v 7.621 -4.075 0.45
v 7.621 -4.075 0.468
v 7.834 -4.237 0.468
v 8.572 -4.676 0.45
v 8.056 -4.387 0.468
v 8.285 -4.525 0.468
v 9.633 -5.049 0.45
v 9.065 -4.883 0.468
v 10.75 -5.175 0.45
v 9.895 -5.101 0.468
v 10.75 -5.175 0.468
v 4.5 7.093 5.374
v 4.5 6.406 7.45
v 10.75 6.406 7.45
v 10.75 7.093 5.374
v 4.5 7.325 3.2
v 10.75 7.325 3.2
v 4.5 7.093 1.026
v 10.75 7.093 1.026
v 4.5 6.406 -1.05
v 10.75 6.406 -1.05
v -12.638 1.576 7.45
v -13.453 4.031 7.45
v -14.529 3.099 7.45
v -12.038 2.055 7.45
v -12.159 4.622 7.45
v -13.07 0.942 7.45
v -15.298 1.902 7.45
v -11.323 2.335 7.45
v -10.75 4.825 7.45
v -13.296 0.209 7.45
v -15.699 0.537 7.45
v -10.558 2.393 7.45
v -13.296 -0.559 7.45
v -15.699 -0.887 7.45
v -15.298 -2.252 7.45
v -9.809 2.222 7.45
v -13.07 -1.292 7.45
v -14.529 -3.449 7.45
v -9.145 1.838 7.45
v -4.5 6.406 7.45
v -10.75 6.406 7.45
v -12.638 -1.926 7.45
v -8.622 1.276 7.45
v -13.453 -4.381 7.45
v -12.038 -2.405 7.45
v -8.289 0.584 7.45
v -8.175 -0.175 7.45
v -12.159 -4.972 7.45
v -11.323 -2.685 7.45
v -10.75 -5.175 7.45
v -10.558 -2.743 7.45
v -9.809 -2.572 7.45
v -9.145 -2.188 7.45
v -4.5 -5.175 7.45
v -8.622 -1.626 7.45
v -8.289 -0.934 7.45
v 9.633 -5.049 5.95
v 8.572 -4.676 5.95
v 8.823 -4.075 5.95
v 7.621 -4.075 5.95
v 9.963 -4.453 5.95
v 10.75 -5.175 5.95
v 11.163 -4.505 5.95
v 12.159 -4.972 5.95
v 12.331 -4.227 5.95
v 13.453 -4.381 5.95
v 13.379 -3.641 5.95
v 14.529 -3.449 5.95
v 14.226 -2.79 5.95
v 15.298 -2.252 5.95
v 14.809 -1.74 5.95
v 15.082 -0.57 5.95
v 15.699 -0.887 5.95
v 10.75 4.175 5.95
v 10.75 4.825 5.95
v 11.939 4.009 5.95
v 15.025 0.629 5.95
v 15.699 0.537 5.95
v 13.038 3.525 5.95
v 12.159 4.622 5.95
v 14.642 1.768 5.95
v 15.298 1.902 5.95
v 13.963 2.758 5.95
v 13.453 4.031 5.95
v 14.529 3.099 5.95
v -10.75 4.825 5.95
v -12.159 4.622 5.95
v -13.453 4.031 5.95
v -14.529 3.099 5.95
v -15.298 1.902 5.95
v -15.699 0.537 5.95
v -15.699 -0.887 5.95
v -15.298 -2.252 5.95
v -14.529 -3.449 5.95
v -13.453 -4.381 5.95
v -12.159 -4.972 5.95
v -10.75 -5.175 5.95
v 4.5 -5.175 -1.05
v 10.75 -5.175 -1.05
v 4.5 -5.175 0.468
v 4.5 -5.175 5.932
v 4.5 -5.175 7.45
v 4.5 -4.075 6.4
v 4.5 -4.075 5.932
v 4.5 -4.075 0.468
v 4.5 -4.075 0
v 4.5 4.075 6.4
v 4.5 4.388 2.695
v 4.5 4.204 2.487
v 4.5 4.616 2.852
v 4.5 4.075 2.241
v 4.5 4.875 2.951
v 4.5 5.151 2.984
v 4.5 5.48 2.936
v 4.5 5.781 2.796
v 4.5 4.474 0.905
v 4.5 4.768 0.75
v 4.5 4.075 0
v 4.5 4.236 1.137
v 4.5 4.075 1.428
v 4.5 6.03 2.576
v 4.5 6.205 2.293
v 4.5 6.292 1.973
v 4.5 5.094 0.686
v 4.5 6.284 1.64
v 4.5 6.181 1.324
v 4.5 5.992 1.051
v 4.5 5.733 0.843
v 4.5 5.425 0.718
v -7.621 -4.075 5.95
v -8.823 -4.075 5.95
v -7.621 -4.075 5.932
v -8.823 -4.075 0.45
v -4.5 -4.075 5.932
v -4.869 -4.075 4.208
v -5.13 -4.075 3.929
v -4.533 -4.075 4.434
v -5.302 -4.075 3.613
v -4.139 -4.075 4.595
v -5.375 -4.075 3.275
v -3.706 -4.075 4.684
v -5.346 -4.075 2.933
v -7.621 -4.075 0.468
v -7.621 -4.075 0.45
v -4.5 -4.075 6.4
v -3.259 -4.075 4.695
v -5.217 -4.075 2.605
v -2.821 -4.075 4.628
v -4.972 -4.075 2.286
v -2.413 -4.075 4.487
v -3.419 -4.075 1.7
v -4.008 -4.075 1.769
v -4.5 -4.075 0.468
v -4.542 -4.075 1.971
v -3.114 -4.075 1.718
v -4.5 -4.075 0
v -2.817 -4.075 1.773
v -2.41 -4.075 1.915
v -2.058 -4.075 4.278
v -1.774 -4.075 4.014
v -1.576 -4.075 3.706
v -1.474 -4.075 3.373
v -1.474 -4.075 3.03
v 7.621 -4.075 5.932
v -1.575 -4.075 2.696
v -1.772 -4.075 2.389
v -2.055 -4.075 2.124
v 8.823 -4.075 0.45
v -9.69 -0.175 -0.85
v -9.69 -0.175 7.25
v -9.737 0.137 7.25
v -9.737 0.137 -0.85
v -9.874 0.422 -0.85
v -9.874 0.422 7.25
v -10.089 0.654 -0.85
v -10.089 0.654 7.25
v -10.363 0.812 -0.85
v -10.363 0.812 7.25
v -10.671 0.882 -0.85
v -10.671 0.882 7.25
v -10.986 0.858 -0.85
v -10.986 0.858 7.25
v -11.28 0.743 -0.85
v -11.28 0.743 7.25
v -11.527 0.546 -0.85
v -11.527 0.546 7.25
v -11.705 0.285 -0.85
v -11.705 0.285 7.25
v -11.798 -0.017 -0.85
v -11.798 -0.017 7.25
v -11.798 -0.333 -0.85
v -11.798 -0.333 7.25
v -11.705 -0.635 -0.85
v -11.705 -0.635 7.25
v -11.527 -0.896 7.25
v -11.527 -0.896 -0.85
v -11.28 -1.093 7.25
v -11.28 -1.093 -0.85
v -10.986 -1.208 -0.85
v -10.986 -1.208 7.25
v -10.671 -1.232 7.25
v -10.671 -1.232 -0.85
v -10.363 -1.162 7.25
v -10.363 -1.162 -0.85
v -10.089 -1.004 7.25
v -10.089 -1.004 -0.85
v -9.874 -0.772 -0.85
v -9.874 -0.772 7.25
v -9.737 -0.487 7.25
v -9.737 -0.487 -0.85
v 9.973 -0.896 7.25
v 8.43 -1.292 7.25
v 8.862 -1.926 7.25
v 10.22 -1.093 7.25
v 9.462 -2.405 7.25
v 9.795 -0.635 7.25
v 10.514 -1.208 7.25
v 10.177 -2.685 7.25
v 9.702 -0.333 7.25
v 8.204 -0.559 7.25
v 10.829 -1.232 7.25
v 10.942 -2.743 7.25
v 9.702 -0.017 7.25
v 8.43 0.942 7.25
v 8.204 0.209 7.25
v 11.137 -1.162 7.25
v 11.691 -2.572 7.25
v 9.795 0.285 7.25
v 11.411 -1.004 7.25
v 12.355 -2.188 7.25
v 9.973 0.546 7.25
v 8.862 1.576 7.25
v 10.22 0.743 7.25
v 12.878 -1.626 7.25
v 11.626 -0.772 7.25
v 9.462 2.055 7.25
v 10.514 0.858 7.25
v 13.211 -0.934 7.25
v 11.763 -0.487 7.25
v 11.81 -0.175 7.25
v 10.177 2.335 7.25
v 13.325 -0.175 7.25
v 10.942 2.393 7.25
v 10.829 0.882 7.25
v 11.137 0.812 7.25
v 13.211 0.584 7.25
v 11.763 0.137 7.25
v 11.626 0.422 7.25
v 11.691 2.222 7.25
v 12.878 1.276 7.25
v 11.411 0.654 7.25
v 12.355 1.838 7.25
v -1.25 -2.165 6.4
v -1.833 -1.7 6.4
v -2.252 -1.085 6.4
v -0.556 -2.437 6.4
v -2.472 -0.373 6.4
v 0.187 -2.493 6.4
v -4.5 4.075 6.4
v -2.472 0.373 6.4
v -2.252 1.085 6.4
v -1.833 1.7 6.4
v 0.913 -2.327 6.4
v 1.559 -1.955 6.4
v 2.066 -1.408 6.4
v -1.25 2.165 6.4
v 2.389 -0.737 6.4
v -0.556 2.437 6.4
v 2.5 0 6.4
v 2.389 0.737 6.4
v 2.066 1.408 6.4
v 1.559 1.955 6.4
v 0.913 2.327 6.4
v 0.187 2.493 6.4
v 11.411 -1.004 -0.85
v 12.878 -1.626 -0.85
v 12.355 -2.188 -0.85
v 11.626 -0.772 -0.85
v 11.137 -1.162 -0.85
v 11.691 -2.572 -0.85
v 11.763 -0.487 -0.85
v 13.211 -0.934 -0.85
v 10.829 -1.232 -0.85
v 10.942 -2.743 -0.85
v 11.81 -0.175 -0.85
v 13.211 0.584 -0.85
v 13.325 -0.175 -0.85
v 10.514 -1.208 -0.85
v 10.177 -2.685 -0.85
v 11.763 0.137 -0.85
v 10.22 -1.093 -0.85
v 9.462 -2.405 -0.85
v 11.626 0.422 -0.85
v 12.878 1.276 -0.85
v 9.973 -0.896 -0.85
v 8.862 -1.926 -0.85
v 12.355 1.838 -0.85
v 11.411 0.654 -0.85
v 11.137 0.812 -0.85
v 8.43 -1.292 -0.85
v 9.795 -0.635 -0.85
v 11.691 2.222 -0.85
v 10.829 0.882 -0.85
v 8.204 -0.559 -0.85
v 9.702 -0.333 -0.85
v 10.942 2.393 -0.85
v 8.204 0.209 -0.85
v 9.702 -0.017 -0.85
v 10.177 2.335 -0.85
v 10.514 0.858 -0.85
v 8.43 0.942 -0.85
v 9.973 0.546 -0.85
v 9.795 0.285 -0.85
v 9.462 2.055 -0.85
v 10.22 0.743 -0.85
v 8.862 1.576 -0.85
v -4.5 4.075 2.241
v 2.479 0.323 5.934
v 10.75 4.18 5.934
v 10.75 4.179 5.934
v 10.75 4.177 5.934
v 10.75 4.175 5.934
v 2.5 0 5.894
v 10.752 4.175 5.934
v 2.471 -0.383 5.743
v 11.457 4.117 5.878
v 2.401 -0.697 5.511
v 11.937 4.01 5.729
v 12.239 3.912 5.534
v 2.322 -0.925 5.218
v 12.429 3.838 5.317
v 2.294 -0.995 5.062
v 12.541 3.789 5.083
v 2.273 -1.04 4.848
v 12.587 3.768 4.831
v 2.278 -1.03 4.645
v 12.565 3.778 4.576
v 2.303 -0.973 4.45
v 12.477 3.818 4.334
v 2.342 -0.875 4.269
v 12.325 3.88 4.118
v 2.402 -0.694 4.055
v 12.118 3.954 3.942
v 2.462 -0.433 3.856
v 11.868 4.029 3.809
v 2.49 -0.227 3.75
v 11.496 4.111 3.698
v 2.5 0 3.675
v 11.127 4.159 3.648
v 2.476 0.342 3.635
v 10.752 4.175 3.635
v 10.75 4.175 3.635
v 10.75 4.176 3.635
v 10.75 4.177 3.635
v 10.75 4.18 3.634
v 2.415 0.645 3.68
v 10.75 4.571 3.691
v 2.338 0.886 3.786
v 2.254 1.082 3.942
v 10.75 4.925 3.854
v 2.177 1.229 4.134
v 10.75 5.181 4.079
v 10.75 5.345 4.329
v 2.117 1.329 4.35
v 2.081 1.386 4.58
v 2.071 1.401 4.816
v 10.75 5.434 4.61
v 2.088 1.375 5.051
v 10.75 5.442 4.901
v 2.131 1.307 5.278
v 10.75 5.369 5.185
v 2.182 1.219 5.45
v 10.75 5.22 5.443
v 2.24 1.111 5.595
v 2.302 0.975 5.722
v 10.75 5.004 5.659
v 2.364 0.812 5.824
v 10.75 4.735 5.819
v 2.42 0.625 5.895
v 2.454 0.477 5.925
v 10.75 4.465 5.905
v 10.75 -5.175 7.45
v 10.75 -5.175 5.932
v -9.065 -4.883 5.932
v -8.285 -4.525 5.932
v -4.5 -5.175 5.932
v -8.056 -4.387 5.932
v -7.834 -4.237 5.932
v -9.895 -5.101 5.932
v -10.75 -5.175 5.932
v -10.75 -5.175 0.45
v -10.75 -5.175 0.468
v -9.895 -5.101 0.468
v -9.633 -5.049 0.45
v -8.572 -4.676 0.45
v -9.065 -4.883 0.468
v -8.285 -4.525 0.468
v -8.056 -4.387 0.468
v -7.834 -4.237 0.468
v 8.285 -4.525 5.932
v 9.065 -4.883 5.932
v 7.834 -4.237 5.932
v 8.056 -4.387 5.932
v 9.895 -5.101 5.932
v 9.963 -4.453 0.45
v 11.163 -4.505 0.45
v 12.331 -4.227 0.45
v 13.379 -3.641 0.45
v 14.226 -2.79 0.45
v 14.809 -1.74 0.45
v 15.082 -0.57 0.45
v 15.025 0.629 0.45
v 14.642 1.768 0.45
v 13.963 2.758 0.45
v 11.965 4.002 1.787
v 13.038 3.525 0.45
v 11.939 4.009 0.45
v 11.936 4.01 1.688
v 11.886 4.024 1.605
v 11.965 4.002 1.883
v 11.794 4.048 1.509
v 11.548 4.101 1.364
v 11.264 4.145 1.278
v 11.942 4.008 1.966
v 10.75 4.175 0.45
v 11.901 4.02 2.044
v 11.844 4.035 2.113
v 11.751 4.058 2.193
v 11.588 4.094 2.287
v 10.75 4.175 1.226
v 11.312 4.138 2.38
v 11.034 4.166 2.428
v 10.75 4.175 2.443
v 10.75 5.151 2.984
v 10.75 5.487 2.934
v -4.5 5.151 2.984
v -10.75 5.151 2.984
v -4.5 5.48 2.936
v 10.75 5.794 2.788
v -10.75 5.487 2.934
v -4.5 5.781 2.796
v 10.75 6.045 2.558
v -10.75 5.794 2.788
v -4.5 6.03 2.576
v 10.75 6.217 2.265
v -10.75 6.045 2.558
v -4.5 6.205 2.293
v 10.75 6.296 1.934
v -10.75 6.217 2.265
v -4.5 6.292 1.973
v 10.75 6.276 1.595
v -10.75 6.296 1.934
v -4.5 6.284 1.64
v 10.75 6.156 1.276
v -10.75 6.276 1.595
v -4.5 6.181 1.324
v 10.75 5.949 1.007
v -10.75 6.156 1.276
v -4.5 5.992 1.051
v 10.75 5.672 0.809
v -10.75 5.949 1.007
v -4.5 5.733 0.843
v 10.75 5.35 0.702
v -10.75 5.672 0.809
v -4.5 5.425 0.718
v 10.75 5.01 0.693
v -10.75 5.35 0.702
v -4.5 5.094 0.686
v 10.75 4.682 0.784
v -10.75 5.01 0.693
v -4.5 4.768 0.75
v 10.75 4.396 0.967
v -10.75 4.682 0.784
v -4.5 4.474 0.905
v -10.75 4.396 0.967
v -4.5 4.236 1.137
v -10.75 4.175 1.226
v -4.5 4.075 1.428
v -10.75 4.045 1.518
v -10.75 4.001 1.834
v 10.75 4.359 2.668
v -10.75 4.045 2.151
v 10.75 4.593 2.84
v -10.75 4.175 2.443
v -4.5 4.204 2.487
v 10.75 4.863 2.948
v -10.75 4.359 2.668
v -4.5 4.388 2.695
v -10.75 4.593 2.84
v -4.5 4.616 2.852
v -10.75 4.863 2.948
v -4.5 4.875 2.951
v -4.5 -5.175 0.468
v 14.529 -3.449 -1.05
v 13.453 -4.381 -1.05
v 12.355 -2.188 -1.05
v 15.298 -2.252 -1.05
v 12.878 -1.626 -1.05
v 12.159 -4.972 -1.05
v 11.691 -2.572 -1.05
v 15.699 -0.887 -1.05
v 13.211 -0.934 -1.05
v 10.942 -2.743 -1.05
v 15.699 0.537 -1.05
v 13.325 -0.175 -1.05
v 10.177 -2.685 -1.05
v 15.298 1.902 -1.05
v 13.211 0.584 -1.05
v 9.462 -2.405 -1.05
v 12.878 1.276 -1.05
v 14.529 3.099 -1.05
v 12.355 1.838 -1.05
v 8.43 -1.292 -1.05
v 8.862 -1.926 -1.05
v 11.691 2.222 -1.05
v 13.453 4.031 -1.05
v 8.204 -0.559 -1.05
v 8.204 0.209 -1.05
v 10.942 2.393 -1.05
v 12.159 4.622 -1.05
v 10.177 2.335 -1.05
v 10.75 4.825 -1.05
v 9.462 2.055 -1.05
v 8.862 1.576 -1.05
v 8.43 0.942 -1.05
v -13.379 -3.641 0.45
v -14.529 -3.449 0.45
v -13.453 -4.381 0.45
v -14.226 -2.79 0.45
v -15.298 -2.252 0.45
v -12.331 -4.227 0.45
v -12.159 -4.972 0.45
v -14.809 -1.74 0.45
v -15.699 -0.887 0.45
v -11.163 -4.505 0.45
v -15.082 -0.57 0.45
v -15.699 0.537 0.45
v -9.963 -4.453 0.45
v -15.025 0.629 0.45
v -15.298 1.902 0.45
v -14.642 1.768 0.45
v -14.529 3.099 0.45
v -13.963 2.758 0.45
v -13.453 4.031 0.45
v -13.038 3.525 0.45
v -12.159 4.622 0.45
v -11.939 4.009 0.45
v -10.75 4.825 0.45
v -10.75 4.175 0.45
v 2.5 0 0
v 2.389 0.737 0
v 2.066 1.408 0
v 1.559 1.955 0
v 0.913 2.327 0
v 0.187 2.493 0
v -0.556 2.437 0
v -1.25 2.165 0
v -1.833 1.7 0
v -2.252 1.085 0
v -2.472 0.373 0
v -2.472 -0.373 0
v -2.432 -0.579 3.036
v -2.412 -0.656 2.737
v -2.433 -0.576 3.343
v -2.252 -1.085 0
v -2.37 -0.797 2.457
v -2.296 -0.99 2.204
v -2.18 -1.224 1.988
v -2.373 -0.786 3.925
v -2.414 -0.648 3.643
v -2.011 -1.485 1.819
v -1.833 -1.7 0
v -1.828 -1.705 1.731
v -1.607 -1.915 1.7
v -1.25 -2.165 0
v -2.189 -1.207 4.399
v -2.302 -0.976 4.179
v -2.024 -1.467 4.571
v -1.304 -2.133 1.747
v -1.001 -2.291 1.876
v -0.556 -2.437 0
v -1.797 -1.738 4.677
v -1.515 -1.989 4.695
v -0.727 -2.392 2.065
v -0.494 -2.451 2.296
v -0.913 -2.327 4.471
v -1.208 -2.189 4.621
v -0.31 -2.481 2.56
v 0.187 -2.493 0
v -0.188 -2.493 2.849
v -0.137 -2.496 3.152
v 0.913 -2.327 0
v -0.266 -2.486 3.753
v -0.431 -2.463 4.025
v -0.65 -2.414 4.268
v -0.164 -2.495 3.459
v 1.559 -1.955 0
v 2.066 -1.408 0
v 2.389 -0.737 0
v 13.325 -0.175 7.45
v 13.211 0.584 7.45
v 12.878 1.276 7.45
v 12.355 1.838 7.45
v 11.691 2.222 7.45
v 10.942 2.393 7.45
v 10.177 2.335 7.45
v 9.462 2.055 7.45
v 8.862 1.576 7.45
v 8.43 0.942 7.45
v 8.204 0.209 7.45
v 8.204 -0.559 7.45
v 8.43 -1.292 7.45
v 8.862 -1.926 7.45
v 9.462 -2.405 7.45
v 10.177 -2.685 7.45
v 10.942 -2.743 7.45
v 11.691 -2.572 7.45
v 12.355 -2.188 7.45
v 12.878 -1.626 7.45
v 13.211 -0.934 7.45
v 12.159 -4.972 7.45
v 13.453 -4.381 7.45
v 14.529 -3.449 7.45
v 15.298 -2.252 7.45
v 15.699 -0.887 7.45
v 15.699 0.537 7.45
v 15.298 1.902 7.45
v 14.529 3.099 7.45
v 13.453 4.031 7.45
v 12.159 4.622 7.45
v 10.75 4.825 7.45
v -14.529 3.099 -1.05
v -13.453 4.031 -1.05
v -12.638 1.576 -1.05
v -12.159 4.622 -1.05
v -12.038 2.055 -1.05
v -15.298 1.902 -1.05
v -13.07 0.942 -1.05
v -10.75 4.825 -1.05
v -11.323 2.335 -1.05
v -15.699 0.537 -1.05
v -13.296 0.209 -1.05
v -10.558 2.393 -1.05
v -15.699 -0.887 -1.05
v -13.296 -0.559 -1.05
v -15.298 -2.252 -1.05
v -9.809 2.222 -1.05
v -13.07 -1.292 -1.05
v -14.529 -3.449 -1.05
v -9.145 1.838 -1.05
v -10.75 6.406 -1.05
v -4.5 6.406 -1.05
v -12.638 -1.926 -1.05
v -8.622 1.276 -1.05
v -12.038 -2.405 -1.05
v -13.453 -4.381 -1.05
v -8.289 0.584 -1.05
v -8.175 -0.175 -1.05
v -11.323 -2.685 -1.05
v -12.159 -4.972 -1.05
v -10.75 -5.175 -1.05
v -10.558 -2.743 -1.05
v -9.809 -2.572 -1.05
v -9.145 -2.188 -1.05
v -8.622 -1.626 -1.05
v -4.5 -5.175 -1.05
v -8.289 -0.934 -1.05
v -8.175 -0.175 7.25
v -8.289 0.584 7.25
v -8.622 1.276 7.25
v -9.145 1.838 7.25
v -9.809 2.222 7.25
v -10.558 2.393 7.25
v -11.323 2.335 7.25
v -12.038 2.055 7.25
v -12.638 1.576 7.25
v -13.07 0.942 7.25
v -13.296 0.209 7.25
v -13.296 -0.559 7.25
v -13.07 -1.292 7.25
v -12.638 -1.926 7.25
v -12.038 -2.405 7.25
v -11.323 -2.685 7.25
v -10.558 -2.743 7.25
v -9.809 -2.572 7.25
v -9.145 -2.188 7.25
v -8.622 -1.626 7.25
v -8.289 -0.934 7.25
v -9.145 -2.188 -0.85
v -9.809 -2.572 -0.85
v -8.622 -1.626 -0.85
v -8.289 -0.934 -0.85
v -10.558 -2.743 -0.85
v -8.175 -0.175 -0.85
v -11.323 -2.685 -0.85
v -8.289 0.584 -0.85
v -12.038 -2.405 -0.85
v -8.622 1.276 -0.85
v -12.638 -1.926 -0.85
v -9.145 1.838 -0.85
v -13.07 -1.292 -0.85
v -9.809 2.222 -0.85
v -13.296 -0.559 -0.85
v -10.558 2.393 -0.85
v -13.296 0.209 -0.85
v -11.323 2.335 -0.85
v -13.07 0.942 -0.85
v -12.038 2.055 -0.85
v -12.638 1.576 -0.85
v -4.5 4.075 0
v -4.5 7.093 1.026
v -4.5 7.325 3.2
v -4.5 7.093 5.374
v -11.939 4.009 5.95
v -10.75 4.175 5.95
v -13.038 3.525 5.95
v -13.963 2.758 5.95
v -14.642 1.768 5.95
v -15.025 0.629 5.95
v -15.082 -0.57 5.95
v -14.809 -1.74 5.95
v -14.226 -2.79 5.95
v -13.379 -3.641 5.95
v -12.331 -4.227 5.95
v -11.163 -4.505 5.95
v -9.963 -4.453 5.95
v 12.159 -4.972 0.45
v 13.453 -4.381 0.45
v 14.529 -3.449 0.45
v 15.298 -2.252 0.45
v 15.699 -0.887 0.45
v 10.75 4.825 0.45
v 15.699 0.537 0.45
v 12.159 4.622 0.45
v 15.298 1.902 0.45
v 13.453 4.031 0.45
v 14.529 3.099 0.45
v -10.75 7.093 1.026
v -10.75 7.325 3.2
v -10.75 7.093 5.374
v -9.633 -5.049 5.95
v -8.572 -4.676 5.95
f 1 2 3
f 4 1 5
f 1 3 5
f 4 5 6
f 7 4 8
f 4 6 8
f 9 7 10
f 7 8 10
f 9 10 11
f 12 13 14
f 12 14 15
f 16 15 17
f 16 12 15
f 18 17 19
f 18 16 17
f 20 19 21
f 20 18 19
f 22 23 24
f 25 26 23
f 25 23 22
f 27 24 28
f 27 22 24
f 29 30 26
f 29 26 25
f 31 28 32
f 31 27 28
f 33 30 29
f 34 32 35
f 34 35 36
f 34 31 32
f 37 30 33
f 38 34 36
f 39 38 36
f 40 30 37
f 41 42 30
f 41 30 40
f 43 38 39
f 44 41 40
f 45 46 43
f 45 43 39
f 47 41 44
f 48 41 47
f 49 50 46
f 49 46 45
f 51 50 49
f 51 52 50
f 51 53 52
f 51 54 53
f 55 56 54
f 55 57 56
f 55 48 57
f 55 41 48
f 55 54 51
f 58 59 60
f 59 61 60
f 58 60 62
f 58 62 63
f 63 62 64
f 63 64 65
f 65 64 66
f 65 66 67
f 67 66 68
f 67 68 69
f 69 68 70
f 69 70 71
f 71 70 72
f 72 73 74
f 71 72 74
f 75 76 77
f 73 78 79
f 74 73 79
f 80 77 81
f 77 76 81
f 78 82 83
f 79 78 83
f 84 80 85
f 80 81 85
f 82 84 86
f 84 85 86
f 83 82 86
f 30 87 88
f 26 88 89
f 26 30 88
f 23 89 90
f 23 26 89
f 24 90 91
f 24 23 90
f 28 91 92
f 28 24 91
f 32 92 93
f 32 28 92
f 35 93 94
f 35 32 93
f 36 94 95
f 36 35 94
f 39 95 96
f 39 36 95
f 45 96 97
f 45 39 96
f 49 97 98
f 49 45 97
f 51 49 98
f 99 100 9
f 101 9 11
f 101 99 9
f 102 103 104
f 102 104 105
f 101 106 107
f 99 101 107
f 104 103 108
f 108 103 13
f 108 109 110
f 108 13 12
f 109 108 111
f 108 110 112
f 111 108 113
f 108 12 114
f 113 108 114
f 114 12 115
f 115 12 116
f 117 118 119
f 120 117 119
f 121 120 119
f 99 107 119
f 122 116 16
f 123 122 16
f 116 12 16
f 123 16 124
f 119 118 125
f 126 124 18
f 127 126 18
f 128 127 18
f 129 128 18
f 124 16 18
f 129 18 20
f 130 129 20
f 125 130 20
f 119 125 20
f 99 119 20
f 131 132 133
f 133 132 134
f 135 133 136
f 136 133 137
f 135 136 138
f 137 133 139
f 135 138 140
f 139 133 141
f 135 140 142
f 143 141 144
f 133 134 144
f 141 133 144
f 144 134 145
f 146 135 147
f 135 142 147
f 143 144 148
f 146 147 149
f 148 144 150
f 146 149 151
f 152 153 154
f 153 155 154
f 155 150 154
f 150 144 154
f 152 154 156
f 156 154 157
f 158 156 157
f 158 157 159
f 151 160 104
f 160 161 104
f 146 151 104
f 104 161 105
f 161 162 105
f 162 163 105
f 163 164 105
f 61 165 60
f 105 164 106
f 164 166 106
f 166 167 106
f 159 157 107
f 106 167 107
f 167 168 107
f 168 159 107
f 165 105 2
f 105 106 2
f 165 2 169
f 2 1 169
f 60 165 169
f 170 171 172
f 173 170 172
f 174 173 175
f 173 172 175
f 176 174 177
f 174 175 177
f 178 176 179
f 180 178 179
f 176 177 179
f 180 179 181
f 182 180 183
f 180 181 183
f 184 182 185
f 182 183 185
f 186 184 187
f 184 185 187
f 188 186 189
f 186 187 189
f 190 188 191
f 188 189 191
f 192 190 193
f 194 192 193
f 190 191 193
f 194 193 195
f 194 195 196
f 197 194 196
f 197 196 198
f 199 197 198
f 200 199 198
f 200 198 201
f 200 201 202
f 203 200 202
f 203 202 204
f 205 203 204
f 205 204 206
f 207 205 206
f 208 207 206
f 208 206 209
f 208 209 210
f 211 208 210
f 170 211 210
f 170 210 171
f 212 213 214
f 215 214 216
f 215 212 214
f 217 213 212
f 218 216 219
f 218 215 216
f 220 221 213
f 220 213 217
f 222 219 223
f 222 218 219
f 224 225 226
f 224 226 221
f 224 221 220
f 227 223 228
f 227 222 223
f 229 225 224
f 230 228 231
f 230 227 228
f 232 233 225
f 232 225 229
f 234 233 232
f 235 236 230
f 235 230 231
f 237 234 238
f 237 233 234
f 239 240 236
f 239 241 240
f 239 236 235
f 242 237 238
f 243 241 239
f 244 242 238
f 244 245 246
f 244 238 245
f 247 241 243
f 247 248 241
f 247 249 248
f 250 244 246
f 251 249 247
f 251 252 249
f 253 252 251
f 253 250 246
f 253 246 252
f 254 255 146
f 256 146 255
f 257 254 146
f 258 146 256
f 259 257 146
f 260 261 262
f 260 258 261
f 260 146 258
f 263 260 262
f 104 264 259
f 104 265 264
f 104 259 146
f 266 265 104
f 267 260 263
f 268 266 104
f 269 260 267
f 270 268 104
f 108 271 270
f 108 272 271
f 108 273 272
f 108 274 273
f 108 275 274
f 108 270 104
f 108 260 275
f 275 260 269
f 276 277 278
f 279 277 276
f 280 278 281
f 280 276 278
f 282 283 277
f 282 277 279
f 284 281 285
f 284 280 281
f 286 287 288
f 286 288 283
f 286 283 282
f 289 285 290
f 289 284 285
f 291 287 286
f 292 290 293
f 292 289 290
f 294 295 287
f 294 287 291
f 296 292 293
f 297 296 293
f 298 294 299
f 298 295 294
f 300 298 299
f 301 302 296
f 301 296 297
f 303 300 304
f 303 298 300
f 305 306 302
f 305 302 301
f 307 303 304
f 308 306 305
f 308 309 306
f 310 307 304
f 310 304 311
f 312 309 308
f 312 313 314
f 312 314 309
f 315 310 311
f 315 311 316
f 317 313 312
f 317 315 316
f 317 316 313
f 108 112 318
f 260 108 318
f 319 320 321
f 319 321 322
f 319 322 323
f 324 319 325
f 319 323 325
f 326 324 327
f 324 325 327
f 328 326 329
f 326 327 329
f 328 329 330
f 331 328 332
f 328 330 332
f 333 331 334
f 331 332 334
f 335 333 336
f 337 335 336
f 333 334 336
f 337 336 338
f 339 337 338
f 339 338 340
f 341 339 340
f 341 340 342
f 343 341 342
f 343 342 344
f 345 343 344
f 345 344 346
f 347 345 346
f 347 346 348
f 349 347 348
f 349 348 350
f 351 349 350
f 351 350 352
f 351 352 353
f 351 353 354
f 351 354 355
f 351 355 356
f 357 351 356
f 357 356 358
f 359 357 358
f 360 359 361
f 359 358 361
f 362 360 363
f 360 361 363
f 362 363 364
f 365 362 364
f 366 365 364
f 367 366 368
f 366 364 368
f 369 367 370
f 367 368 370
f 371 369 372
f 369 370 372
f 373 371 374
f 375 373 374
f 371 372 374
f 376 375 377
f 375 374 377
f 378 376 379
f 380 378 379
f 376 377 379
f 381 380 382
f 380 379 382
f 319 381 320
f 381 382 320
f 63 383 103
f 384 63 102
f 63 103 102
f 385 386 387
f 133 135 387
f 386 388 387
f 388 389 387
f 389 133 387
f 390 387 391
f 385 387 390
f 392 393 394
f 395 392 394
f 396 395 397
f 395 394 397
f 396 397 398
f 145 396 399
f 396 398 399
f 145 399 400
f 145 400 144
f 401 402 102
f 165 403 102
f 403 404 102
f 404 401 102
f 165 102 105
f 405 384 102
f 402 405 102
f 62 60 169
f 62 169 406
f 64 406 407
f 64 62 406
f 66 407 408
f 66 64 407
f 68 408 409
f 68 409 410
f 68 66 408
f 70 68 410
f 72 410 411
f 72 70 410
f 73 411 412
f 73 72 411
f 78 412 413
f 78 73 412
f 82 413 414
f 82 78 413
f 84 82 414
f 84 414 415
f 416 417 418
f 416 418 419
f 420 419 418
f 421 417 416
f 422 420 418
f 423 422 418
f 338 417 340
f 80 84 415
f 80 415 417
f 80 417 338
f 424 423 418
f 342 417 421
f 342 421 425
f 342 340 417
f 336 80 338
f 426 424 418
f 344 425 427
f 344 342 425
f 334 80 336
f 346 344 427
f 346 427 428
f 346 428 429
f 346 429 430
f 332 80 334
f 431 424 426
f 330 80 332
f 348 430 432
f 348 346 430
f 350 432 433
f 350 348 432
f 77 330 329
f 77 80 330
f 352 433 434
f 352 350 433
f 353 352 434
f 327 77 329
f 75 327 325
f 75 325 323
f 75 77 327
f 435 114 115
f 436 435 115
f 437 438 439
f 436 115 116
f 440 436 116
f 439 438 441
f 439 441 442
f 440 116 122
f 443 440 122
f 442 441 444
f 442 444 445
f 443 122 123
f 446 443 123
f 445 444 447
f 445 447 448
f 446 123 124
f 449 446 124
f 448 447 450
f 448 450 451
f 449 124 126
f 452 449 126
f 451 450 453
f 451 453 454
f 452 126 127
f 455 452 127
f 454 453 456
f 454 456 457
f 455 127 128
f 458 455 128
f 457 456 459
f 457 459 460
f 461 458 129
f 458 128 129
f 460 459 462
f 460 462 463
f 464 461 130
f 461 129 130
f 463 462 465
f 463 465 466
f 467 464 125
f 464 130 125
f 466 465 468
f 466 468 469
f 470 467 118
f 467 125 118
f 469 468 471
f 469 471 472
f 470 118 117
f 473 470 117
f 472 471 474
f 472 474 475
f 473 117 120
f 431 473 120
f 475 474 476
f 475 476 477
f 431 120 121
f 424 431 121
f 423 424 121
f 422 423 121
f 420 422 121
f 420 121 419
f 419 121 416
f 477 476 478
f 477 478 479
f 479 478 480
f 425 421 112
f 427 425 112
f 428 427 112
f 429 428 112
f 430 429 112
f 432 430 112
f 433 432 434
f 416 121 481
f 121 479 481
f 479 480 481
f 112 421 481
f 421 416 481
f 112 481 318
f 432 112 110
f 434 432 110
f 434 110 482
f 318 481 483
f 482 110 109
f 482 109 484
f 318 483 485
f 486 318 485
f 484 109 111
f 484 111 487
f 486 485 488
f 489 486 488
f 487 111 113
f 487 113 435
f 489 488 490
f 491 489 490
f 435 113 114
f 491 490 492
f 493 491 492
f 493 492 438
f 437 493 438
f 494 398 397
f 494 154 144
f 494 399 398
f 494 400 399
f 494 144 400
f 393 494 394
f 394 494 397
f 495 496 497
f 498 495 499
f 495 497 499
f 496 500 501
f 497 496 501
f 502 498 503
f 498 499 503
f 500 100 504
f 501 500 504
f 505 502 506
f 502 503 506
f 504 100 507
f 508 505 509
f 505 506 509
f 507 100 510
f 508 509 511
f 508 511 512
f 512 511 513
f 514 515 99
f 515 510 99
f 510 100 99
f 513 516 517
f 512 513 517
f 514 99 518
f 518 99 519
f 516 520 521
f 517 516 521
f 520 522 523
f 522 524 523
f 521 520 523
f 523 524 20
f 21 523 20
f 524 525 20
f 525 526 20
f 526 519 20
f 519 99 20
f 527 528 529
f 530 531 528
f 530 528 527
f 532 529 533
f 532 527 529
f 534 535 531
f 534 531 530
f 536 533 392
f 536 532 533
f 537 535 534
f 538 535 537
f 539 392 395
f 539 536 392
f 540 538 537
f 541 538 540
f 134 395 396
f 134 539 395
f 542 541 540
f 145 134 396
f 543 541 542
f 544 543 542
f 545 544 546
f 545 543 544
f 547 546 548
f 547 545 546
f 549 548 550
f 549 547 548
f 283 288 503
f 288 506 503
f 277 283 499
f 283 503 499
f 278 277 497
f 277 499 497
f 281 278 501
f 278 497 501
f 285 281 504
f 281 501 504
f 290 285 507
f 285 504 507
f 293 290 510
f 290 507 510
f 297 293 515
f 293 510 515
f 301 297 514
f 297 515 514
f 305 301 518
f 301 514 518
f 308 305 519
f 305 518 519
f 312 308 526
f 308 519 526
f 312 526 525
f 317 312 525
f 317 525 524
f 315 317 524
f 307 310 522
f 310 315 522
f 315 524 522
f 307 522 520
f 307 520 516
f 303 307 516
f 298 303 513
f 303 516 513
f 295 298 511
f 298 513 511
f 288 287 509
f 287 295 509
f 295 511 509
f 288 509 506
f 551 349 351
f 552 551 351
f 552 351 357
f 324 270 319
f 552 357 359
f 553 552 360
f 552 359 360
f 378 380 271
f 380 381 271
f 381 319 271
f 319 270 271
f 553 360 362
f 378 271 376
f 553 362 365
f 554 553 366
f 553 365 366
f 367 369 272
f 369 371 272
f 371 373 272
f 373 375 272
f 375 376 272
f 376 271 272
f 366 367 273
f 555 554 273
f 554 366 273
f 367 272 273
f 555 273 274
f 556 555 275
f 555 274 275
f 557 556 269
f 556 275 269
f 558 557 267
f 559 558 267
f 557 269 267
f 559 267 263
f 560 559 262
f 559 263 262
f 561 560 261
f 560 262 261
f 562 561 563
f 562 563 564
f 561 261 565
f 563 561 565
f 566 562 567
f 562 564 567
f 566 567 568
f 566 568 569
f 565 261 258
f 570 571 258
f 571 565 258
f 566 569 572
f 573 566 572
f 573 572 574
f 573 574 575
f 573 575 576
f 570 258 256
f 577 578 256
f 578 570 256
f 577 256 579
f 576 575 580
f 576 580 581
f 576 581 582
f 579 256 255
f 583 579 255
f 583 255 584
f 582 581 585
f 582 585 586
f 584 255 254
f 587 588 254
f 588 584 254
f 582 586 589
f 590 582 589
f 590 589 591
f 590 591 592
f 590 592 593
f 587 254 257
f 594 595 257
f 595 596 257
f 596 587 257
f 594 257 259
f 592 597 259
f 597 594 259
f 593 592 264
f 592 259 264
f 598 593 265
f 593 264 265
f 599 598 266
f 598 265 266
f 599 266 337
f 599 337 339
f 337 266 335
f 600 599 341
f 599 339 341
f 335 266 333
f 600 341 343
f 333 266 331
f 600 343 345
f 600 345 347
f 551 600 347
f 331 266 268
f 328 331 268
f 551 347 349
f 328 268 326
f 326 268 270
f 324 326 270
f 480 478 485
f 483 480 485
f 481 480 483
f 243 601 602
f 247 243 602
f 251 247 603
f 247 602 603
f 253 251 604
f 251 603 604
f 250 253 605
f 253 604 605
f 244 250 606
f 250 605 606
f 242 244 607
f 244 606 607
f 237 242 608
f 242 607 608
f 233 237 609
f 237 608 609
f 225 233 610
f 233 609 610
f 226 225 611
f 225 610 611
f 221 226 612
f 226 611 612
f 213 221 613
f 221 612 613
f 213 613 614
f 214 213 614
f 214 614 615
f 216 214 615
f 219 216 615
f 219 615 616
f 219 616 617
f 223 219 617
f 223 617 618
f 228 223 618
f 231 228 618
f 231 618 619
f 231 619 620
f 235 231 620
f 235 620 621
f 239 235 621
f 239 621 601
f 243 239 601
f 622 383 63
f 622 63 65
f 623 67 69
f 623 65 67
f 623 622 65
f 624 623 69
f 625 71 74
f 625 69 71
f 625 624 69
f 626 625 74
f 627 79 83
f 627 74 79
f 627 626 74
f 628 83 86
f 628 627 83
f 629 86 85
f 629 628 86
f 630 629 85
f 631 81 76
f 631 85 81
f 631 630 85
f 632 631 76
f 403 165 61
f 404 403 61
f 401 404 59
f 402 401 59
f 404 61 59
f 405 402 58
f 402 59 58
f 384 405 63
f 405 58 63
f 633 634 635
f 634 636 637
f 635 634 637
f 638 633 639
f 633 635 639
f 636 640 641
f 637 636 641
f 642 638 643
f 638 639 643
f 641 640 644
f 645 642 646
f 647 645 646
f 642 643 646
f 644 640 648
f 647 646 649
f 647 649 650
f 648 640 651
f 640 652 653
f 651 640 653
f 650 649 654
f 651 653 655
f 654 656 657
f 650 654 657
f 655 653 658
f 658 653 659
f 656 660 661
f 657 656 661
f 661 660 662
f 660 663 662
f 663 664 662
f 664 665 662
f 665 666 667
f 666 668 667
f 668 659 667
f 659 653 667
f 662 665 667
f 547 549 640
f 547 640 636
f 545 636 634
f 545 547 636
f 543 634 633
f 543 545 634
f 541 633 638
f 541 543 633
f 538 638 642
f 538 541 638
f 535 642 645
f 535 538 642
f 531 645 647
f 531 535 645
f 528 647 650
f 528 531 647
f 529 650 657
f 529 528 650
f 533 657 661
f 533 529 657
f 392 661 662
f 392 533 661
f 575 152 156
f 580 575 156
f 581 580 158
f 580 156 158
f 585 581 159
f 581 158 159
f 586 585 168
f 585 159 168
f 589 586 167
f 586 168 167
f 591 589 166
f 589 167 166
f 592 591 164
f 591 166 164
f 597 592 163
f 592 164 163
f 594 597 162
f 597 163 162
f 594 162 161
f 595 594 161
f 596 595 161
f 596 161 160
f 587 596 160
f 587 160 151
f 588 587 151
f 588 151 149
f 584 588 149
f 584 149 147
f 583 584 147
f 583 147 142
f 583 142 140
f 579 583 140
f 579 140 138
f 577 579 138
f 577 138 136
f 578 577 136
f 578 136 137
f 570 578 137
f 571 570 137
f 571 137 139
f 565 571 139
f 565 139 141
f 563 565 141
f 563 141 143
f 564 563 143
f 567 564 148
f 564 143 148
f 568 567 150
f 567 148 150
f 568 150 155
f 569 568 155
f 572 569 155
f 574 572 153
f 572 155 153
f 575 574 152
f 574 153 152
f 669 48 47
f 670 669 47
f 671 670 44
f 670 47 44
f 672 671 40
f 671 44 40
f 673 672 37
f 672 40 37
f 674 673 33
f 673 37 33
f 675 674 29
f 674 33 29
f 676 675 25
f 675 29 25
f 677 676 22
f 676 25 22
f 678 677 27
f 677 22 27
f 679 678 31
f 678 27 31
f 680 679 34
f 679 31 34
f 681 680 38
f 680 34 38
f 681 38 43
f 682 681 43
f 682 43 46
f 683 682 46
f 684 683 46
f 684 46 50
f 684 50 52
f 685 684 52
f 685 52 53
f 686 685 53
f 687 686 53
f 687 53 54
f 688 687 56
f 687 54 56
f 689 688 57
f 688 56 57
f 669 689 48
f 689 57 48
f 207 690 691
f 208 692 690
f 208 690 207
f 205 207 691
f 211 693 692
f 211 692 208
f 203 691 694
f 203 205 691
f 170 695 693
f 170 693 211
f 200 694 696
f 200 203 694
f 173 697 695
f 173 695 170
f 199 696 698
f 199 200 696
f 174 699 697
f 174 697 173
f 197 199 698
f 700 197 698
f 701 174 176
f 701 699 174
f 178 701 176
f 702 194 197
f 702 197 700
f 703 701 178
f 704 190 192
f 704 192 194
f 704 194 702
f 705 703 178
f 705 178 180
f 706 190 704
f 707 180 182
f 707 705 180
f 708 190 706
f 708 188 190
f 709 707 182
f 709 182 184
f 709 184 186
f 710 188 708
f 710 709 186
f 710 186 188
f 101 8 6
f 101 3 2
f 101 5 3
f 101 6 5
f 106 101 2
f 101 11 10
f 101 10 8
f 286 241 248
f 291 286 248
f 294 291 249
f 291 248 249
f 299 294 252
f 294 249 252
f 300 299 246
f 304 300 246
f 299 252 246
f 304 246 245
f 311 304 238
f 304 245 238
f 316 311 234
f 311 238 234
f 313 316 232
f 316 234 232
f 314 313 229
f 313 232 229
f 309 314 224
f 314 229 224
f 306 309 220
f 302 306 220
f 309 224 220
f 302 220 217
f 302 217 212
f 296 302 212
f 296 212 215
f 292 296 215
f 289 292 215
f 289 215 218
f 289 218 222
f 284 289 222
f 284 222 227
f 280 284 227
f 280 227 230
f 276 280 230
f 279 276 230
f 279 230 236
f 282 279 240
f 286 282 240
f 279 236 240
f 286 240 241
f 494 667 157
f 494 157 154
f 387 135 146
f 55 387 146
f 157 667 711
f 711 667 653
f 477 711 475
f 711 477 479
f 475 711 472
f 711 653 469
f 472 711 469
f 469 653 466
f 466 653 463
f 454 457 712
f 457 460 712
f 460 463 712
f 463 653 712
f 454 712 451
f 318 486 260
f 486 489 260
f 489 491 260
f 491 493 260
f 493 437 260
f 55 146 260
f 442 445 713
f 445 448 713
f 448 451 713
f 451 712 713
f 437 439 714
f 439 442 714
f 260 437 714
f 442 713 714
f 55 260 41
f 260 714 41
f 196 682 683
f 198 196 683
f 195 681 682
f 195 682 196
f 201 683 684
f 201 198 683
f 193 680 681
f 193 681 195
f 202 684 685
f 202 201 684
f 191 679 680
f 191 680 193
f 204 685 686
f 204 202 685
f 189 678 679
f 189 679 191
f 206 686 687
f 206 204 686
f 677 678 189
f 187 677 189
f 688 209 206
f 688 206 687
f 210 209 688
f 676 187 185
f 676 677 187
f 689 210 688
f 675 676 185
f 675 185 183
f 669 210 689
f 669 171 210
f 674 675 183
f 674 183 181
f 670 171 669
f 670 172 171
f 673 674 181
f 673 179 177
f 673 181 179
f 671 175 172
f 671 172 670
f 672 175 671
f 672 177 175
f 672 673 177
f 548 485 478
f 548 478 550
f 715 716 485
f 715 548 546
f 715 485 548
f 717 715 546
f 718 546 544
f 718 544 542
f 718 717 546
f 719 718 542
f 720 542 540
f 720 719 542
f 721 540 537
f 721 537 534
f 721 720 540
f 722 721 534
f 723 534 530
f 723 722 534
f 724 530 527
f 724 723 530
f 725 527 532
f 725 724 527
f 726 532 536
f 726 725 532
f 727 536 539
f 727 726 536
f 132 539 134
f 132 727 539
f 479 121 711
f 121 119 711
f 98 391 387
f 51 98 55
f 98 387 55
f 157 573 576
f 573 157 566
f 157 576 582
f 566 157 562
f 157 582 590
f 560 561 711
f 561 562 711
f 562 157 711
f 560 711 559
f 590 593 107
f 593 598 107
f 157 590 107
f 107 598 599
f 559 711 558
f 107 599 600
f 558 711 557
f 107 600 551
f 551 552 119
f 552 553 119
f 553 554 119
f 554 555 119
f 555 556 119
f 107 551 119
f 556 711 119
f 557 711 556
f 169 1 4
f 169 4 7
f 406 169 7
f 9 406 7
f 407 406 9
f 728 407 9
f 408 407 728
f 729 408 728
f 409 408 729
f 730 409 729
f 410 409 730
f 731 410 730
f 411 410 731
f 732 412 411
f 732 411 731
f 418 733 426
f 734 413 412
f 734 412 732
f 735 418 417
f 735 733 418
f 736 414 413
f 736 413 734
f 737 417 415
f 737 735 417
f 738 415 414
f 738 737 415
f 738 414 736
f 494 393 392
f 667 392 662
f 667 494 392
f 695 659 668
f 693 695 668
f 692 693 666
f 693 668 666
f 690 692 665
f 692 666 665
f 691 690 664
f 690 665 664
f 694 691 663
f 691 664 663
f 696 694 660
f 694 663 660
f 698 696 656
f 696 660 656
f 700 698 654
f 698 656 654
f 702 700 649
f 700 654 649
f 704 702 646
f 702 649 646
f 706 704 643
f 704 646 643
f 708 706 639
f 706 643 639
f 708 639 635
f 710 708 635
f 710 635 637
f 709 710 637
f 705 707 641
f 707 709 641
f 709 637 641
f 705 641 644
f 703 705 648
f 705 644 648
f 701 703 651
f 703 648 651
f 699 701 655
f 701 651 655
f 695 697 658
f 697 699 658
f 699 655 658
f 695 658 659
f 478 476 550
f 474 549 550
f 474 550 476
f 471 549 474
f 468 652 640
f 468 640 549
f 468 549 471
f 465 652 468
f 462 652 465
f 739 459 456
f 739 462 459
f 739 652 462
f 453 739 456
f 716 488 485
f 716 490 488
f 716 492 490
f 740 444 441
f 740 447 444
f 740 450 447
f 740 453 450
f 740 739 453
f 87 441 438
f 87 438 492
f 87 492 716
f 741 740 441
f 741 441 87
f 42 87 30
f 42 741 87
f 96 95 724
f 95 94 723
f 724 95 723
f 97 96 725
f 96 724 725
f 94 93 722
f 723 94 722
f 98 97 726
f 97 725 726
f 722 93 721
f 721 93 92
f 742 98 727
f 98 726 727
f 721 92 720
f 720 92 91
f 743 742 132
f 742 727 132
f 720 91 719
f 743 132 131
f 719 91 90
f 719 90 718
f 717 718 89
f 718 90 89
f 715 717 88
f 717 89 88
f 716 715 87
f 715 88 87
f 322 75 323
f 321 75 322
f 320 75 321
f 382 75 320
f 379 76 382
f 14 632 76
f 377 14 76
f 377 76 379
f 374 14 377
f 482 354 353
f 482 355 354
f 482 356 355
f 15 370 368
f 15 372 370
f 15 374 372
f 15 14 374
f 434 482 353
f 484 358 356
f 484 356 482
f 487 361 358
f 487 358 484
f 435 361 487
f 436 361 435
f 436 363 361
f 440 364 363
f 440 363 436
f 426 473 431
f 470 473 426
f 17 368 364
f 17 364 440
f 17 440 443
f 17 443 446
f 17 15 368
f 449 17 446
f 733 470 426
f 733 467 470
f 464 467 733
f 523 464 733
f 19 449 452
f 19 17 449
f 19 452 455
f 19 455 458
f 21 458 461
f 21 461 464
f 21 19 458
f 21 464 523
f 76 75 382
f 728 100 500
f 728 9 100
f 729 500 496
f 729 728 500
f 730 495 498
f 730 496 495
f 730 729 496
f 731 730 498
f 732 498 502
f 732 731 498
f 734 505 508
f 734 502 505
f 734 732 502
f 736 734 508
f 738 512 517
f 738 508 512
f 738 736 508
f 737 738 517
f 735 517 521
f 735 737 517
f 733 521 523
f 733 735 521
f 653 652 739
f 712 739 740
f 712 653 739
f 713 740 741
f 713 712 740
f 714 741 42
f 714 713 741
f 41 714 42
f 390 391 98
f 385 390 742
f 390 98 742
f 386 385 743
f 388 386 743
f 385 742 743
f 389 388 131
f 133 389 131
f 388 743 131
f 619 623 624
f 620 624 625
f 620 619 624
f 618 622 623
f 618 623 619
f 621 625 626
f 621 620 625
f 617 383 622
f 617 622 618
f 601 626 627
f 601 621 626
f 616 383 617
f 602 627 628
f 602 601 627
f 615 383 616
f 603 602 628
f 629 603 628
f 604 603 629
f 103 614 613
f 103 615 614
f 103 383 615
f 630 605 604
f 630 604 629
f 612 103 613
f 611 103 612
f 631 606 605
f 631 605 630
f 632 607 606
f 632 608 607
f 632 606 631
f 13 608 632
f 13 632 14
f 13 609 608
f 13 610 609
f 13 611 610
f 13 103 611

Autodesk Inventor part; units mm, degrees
sketch "Sketch1" plane through (0, 0, 0) normal (0, 0, 1) x (1, 0, 0)
  line L0 (-4.5, -4.075) -> (4.5, -4.075)
  line L1 (4.5, -4.075) -> (4.5, 4.075)
  line L2 (4.5, 4.075) -> (-4.5, 4.075)
  line L3 (-4.5, 4.075) -> (-4.5, -4.075)
  line L4 (-4.5, -4.075) -> (4.5, 4.075) construction
  line L5 (4.5, -4.075) -> (-4.5, 4.075) construction
  point P0 (0, 0)
  dimension "d0" = 9
  dimension "d1" = 8.15
extrude "Extrusion1" add sketch "Sketch1" along normal blind 6.4
sketch "Sketch2" plane through (4.5, -4.075, 0) normal (1, 0, 0) x (0, 0, -1)
  line L0 (0, 8.15) -> (-6.4, 8.15) projected
  line L1 (-3.2, 8.15) -> (-3.2, 11.4)
  line L2 (-3.2, 8.15) -> (-7.45, 8.15)
  line L3 (-7.45, 8.15) -> (-7.45, -1.1)
  line L4 (0, 0) -> (-6.4, 0) projected
  line L5 (-5.9325, -1.1) -> (-5.9325, 0)
  line L6 (-7.45, -1.1) -> (-5.9325, -1.1)
  line L7 (-7.45, 8.15) -> (-7.45, 13.2689)
  line L8 (1.05, 8.15) -> (1.05, -1.1)
  line L9 (-0.4675, -1.1) -> (-0.4675, 0)
  line L10 (1.05, -1.1) -> (-0.4675, -1.1)
  line L11 (1.05, 8.15) -> (1.05, 13.2689)
  arc A0 (1.05, 10.4813) -> (-7.45, 10.4813) centre (-3.2, 1.1101) ccw
  line L12 (-7.45, 10.4813) -> (1.05, 10.4813) construction
  line L13 (-7.45, 10.4813) -> (1.05, 10.4813) construction
  point P0 (0, 4.075)
  point P1 (-0.4675, 0)
  dimension "d4" = 3.25
  dimension "d5" = 4.25
  dimension "d6" = 9.25
  dimension "d8" = 0
extrude "Extrusion2" add sketch "Sketch2" along normal blind 6.25
mirror "Mirror1" about plane through (0, 0, 0) normal (1, 0, 0) of "Extrusion2"
sketch "Sketch3" plane through (4.5, -5.175, 7.45) normal (0, 0, 1) x (1, 0, 0)
  line L0 (6.25, 0) -> (6.25, 11.5813) projected
  circle A0 centre (6.25, 5) radius 5
  line L1 (-4.5, 5.175) -> (-4.5, 2.6281)
  circle A1 centre (-15.25, 5) radius 5
  dimension "d11" = 10
extrude "Extrusion3" add sketch "Sketch3" against normal up to surface (8.5 mm away)
sketch "Sketch4" plane through (0, 0, 0) normal (1, 0, 0) x (0, 1, 0)
  line L0 (-5.175, 5.9325) -> (-4.075, 5.9325) projected
  line L1 (-4.075, 5.9325) -> (-4.075, 0.4675) projected
  line L2 (-4.075, 0.4675) -> (-5.175, 0.4675) projected
  line L3 (-5.175, 7.45) -> (-5.175, 5.9325) projected
  line L4 (-5.175, 0.4675) -> (-5.175, -1.05) projected
  line L5 (-5.175, 5.9325) -> (-5.175, 0.4675)
  line L6 (-5.175, 0.4675) -> (-4.525, 0.4675)
  line L7 (-4.525, 0.4675) -> (-4.525, 5.9325)
  line L8 (-5.175, 5.9325) -> (-4.075, 5.9325) projected
  line L9 (-4.525, 5.9325) -> (-5.175, 5.9325)
  point P0 (0, 0)
  dimension "d25" = 0.65
extrude "Extrusion4" cut sketch "Sketch4" against normal through all both and the other way through all contours L0 L7 L2 L5
sketch "Sketch5" plane through (4.5, -5.175, 7.45) normal (0, 0, 1) x (1, 0, 0)
  arc A0 (6.25, 0) -> (6.25, 10) centre (6.25, 5) ccw projected
  circle A1 centre (6.25, 5) radius 1.06
  line L0 (-4.5, 5.175) -> (-4.5, 8.0603)
  circle A2 centre (-15.25, 5) radius 1.06
  dimension "d16" = 2.12
extrude "Extrusion5" cut sketch "Sketch5" against normal through all
ref_plane "Work Plane1" through (4.5, -5.175, 3.2) normal (0, 0, 1) x (1, 0, 0)
sketch "Sketch6" plane through (4.5, -5.175, 3.2) normal (0, 0, 1) x (1, 0, 0)
  circle A0 centre (6.25, 5) radius 1.06 projected
  arc A1 (3.1211, 1.1) -> (6.25, 10) centre (6.25, 5) ccw
  arc A2 (4.3232, 1.1) -> (6.25, 9.35) centre (6.25, 5) ccw
  line L0 (-4.5, 5.175) -> (-4.5, 10.9933)
  line L1 (0, 1.1) -> (3.1211, 1.1) projected
  line L2 (3.1211, 1.1) -> (4.3232, 1.1)
  arc A3 (6.25, 0) -> (6.25, 10) centre (6.25, 5) ccw projected
  line L3 (6.25, 10) -> (6.25, 9.35)
  line L4 (6.25, 10) -> (6.25, 11.5813) projected
  circle A4 centre (-15.25, 5) radius 1.06
  arc A5 (-15.25, 10) -> (-12.1211, 1.1) centre (-15.25, 5) ccw
  arc A6 (-15.25, 9.35) -> (-13.3232, 1.1) centre (-15.25, 5) ccw
  line L5 (-12.1211, 1.1) -> (-13.3232, 1.1)
  arc A7 (-15.25, 10) -> (-15.25, 0) centre (-15.25, 5) ccw
  line L6 (-15.25, 10) -> (-15.25, 9.35)
  dimension "d19" = 8.7
extrude "Extrusion6" cut sketch "Sketch6" against normal mid plane 5.5 contours L2 A2 L3 A1 | L6 A6 L5 A5
sketch "Sketch7" plane through (0, 0, 6.4) normal (0, 0, 1) x (1, 0, 0)
  circle A0 centre (0, 0) radius 2.5
  dimension "d22" = 5
extrude "Extrusion7" cut sketch "Sketch7" against normal through all
ref_plane "Work Plane2" through (-4.5, -5.175, 7.45) normal (-0.6428, -0.766, 0) x (0, 0, -1)
sketch "Sketch8" plane through (-4.5, -5.175, 7.45) normal (-0.6428, -0.766, 0) x (0, 0, -1)
  line L0 (7.45, 2.6208) -> (7.45, -2.3792) projected
  line L1 (1.05, -2.3792) -> (1.05, 2.6208) projected
  line L2 (1.05, 0.1208) -> (7.45, 0.1208)
  circle A0 centre (4.25, 0.1208) radius 1.5
  dimension "d27" = 3
extrude "Extrusion8" cut sketch "Sketch8" against normal blind 5.5
ref_plane "Work Plane3" through (10.75, 4.175, 3.2) normal (0.9063, 0.4226, 0) x (0, 0, 1)
sketch "Sketch9" plane through (10.75, 4.175, 3.2) normal (0.9063, 0.4226, 0) x (0, 0, 1)
  line L0 (-3.2, -3.2593) -> (-3.2, 1.7407) projected
  line L1 (3.2, 1.7407) -> (3.2, -3.2593) projected
  circle A0 centre (1.5845, -0.0043) radius 1.15
  point P0 (-3.2, -0.7593)
  point P1 (0, 1.4454)
  dimension "d31" = 2.3
extrude "Extrusion9" cut sketch "Sketch9" along normal blind 5.5 and the other way blind 11.25
sketch "Sketch10" plane through (-10.75, -2.9649, 3.2) normal (-1, 0, 0) x (0, 0, 1)
  circle A0 centre (-1.3656, 8.1157) radius 1.15
  point P0 (-3.2, 2.9649)
  dimension "d36" = 2.3
extrude "Extrusion10" cut sketch "Sketch10" against normal through all
sketch "Sketch11" plane through (-4.5, -5.175, 7.45) normal (0, 0, 1) x (1, 0, 0)
  circle A0 centre (-6.25, 5) radius 1.06 projected
  circle A1 centre (-6.25, 5) radius 2.575
  line L0 (4.5, 5.175) -> (4.5, 11.4443)
  circle A2 centre (15.25, 5) radius 2.575
  dimension "d39" = 5.15
extrude "Extrusion11" cut sketch "Sketch11" against normal blind 0.2
mirror "Mirror2" about plane through (4.5, -5.175, 3.2) normal (0, 0, 1) of "Extrusion11"
properties part number "Middle"
